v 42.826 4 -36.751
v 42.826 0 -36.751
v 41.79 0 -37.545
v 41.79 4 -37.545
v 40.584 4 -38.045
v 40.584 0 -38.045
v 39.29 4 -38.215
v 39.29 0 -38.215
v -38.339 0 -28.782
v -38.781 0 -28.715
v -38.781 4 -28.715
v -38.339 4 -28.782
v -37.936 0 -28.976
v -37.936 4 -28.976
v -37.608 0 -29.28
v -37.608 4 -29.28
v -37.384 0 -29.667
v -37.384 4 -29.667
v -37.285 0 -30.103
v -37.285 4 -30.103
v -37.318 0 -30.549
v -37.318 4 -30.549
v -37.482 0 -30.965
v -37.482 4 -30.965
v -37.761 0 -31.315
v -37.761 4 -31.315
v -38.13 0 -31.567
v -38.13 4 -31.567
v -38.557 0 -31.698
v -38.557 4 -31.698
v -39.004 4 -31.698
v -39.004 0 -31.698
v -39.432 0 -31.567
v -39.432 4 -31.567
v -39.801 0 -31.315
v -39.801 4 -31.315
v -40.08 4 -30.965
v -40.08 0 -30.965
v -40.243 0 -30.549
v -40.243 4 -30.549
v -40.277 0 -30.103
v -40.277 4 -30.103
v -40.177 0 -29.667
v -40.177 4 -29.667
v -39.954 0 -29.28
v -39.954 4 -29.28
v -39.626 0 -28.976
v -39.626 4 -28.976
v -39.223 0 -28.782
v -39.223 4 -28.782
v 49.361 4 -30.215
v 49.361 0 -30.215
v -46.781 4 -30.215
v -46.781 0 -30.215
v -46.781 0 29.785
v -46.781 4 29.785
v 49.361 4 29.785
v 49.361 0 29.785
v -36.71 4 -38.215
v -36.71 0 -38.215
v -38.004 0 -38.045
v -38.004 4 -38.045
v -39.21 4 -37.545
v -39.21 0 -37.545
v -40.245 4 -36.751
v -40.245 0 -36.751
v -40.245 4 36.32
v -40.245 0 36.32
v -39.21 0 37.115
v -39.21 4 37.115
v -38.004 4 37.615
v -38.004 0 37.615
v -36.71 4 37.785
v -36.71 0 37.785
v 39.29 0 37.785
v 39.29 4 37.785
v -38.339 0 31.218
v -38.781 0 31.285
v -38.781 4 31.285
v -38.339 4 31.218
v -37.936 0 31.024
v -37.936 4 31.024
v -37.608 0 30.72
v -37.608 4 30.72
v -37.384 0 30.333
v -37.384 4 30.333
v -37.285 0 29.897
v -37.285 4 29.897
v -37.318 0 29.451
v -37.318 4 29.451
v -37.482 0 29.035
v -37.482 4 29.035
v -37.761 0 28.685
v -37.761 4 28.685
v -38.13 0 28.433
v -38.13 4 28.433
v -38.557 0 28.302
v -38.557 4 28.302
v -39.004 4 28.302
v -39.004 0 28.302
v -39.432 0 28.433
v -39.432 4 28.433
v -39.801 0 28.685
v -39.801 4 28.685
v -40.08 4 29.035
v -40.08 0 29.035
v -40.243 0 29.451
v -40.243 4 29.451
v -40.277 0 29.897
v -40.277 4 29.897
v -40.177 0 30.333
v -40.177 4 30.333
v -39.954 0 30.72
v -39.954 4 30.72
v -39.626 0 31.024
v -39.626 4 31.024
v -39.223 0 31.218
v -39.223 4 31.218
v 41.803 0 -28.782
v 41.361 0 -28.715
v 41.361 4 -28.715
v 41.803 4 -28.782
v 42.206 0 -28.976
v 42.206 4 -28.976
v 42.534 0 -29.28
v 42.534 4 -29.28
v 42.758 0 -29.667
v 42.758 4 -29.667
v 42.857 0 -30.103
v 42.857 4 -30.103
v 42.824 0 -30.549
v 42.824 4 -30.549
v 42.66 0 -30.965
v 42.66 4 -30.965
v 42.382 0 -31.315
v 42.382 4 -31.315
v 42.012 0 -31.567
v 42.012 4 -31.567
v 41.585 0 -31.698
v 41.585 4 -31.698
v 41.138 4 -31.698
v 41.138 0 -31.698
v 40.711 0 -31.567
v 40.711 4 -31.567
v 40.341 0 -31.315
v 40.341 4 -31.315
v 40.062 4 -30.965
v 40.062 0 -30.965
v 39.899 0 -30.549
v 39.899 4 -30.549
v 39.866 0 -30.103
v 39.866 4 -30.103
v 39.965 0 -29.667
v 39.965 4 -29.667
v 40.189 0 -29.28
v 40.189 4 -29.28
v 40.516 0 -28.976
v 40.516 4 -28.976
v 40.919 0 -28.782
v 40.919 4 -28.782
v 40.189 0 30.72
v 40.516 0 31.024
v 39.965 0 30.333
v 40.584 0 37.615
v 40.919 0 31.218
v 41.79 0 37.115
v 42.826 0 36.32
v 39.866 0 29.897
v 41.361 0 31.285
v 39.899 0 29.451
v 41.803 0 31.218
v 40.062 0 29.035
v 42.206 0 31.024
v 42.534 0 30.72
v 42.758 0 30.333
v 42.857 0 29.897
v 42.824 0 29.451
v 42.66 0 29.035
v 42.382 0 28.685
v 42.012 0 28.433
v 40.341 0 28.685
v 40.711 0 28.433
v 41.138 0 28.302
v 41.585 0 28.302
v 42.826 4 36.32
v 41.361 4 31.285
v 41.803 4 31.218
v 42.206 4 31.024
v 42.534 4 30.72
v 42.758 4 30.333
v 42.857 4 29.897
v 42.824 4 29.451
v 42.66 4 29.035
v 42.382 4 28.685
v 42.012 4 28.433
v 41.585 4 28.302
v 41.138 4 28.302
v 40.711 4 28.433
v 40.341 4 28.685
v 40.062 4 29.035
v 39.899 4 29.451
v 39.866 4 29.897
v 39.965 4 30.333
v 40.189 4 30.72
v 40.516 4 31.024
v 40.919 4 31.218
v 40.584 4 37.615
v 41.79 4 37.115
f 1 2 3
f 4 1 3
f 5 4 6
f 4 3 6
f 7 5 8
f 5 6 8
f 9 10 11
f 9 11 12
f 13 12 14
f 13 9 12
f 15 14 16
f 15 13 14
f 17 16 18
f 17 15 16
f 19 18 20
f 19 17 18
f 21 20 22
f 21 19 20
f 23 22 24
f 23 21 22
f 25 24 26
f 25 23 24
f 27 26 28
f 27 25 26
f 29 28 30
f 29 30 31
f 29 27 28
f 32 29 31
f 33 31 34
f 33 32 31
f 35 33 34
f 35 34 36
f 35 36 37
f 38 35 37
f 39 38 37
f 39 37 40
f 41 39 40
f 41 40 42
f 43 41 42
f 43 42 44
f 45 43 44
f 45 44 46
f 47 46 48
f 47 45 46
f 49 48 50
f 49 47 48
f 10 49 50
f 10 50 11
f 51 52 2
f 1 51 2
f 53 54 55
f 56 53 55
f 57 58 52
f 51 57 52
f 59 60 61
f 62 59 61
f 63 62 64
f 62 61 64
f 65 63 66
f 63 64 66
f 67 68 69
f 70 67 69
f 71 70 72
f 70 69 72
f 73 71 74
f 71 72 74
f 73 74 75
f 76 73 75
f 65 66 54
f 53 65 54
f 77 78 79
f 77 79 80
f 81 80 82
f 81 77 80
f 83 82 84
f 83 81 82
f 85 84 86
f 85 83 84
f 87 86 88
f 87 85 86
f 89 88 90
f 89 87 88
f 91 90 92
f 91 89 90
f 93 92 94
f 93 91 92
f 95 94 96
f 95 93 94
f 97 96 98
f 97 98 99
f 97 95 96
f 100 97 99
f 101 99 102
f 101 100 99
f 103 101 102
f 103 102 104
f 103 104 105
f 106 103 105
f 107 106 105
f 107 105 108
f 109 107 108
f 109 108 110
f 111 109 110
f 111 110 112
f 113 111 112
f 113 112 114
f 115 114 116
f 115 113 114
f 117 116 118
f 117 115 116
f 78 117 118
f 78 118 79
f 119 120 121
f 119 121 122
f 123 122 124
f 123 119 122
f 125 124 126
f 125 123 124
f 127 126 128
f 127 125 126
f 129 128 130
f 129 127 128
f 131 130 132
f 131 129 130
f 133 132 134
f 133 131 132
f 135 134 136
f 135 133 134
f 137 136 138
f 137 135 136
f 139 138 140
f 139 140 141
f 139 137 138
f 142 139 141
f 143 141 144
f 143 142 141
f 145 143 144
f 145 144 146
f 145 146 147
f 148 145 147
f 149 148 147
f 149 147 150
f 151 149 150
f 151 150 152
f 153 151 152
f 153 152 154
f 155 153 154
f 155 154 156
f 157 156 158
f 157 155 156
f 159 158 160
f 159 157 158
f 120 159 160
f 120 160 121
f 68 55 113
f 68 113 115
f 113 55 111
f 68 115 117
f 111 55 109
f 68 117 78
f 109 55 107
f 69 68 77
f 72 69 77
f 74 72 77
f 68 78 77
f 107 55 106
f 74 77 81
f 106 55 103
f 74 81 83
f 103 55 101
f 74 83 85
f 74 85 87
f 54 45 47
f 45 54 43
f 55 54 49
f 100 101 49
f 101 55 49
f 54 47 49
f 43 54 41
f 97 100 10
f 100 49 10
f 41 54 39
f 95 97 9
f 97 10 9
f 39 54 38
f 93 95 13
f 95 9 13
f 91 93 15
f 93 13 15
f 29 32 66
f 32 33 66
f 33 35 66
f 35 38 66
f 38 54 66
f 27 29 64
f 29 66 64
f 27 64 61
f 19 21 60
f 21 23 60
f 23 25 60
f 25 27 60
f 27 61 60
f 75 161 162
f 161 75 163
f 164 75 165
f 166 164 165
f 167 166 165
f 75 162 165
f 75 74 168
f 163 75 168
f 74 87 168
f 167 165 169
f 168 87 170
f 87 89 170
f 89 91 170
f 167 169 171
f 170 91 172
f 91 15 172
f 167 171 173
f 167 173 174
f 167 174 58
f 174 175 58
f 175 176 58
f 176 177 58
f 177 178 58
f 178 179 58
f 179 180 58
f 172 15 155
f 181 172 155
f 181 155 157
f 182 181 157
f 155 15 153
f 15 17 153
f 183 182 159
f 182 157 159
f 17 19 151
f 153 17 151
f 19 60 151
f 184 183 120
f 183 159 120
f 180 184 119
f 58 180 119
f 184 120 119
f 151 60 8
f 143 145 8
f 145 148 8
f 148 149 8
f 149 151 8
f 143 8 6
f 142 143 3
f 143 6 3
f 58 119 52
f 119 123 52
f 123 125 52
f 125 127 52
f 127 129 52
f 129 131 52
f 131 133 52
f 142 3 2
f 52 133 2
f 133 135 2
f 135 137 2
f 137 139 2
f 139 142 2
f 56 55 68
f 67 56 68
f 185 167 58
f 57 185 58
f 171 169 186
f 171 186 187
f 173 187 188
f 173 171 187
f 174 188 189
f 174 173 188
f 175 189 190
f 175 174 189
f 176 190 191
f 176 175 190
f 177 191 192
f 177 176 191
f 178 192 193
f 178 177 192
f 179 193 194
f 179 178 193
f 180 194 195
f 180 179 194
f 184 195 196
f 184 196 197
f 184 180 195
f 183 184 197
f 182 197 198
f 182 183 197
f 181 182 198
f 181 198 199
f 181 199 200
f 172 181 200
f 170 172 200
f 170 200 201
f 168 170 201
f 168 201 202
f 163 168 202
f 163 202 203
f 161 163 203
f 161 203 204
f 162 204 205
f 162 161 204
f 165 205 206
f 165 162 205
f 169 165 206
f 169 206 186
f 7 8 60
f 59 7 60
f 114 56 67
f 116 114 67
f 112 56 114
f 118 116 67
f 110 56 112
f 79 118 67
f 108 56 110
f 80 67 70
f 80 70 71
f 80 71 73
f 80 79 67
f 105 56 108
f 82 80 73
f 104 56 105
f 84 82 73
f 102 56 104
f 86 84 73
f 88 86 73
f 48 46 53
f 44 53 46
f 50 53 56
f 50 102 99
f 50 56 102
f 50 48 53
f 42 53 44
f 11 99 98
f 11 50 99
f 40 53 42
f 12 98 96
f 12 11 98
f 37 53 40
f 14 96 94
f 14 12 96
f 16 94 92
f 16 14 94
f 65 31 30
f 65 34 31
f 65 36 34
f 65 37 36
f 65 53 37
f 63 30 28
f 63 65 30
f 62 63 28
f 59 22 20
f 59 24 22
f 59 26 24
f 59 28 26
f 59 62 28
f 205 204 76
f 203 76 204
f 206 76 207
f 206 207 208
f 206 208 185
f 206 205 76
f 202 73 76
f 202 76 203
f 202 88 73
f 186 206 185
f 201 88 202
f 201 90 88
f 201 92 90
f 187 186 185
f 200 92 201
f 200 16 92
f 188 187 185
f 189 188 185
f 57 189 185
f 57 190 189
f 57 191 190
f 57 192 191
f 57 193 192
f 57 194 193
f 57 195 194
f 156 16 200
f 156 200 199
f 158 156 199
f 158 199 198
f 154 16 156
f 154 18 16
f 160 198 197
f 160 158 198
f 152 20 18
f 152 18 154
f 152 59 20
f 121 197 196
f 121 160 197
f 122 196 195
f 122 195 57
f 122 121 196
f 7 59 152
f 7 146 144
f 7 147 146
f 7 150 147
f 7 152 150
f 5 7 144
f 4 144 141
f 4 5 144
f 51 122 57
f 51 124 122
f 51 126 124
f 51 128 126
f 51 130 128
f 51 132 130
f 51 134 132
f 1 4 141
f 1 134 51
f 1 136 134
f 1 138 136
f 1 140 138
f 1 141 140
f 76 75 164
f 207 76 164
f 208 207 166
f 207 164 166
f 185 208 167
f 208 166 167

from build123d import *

# Parameters (mm, degrees)
SKETCH1_R           = 1.5
BOSS_EXTRUDE1_DEPTH = 4


with BuildPart() as part:
    # Sketch1 → Boss-Extrude1 (new body)
    with BuildSketch(Plane(origin=(0, 0, 0), x_dir=(1, 0, 0), z_dir=(0, 1, 0))):
        with BuildLine():
            Line((-40.245236531, 36.750583468), (-46.780770437, 30.215049562))
            Line((-46.780770437, 30.215049562), (-46.780770437, -29.784950438))
            Line((-46.780770437, -29.784950438), (-40.245236531, -36.320484344))
            ThreePointArc((-40.245236531, -36.320484344), (-38.623119787, -37.4043481), (-36.709702625, -37.784950438))
            Line((-36.709702625, -37.784950438), (39.290297375, -37.784950438))
            ThreePointArc((39.290297375, -37.784950438), (41.203714536, -37.4043481), (42.82583128, -36.320484344))
            Line((42.82583128, -36.320484344), (49.361365186, -29.784950438))
            Line((49.361365186, -29.784950438), (49.361365186, 30.215049562))
            Line((49.361365186, 30.215049562), (42.82583128, 36.750583468))
            ThreePointArc((42.82583128, 36.750583468), (41.203714536, 37.834447225), (39.290297375, 38.215049562))
            Line((39.290297375, 38.215049562), (-36.709702625, 38.215049562))
            ThreePointArc((-36.709702625, 38.215049562), (-38.623119787, 37.834447225), (-40.245236531, 36.750583468))
        make_face()
        with Locations(Location((41.361365186, -29.784950438, 0), (0, 0, 270))):
            Circle(SKETCH1_R, mode=Mode.SUBTRACT)
        with Locations(Location((41.361365186, 30.215049562, 0), (0, 0, 270))):
            Circle(SKETCH1_R, mode=Mode.SUBTRACT)
        with Locations(Location((-38.780770437, -29.784950438, 0), (0, 0, 270))):
            Circle(SKETCH1_R, mode=Mode.SUBTRACT)
        with Locations(Location((-38.780770437, 30.215049562, 0), (0, 0, 270))):
            Circle(SKETCH1_R, mode=Mode.SUBTRACT)
    extrude(amount=BOSS_EXTRUDE1_DEPTH)


solid = part.part
